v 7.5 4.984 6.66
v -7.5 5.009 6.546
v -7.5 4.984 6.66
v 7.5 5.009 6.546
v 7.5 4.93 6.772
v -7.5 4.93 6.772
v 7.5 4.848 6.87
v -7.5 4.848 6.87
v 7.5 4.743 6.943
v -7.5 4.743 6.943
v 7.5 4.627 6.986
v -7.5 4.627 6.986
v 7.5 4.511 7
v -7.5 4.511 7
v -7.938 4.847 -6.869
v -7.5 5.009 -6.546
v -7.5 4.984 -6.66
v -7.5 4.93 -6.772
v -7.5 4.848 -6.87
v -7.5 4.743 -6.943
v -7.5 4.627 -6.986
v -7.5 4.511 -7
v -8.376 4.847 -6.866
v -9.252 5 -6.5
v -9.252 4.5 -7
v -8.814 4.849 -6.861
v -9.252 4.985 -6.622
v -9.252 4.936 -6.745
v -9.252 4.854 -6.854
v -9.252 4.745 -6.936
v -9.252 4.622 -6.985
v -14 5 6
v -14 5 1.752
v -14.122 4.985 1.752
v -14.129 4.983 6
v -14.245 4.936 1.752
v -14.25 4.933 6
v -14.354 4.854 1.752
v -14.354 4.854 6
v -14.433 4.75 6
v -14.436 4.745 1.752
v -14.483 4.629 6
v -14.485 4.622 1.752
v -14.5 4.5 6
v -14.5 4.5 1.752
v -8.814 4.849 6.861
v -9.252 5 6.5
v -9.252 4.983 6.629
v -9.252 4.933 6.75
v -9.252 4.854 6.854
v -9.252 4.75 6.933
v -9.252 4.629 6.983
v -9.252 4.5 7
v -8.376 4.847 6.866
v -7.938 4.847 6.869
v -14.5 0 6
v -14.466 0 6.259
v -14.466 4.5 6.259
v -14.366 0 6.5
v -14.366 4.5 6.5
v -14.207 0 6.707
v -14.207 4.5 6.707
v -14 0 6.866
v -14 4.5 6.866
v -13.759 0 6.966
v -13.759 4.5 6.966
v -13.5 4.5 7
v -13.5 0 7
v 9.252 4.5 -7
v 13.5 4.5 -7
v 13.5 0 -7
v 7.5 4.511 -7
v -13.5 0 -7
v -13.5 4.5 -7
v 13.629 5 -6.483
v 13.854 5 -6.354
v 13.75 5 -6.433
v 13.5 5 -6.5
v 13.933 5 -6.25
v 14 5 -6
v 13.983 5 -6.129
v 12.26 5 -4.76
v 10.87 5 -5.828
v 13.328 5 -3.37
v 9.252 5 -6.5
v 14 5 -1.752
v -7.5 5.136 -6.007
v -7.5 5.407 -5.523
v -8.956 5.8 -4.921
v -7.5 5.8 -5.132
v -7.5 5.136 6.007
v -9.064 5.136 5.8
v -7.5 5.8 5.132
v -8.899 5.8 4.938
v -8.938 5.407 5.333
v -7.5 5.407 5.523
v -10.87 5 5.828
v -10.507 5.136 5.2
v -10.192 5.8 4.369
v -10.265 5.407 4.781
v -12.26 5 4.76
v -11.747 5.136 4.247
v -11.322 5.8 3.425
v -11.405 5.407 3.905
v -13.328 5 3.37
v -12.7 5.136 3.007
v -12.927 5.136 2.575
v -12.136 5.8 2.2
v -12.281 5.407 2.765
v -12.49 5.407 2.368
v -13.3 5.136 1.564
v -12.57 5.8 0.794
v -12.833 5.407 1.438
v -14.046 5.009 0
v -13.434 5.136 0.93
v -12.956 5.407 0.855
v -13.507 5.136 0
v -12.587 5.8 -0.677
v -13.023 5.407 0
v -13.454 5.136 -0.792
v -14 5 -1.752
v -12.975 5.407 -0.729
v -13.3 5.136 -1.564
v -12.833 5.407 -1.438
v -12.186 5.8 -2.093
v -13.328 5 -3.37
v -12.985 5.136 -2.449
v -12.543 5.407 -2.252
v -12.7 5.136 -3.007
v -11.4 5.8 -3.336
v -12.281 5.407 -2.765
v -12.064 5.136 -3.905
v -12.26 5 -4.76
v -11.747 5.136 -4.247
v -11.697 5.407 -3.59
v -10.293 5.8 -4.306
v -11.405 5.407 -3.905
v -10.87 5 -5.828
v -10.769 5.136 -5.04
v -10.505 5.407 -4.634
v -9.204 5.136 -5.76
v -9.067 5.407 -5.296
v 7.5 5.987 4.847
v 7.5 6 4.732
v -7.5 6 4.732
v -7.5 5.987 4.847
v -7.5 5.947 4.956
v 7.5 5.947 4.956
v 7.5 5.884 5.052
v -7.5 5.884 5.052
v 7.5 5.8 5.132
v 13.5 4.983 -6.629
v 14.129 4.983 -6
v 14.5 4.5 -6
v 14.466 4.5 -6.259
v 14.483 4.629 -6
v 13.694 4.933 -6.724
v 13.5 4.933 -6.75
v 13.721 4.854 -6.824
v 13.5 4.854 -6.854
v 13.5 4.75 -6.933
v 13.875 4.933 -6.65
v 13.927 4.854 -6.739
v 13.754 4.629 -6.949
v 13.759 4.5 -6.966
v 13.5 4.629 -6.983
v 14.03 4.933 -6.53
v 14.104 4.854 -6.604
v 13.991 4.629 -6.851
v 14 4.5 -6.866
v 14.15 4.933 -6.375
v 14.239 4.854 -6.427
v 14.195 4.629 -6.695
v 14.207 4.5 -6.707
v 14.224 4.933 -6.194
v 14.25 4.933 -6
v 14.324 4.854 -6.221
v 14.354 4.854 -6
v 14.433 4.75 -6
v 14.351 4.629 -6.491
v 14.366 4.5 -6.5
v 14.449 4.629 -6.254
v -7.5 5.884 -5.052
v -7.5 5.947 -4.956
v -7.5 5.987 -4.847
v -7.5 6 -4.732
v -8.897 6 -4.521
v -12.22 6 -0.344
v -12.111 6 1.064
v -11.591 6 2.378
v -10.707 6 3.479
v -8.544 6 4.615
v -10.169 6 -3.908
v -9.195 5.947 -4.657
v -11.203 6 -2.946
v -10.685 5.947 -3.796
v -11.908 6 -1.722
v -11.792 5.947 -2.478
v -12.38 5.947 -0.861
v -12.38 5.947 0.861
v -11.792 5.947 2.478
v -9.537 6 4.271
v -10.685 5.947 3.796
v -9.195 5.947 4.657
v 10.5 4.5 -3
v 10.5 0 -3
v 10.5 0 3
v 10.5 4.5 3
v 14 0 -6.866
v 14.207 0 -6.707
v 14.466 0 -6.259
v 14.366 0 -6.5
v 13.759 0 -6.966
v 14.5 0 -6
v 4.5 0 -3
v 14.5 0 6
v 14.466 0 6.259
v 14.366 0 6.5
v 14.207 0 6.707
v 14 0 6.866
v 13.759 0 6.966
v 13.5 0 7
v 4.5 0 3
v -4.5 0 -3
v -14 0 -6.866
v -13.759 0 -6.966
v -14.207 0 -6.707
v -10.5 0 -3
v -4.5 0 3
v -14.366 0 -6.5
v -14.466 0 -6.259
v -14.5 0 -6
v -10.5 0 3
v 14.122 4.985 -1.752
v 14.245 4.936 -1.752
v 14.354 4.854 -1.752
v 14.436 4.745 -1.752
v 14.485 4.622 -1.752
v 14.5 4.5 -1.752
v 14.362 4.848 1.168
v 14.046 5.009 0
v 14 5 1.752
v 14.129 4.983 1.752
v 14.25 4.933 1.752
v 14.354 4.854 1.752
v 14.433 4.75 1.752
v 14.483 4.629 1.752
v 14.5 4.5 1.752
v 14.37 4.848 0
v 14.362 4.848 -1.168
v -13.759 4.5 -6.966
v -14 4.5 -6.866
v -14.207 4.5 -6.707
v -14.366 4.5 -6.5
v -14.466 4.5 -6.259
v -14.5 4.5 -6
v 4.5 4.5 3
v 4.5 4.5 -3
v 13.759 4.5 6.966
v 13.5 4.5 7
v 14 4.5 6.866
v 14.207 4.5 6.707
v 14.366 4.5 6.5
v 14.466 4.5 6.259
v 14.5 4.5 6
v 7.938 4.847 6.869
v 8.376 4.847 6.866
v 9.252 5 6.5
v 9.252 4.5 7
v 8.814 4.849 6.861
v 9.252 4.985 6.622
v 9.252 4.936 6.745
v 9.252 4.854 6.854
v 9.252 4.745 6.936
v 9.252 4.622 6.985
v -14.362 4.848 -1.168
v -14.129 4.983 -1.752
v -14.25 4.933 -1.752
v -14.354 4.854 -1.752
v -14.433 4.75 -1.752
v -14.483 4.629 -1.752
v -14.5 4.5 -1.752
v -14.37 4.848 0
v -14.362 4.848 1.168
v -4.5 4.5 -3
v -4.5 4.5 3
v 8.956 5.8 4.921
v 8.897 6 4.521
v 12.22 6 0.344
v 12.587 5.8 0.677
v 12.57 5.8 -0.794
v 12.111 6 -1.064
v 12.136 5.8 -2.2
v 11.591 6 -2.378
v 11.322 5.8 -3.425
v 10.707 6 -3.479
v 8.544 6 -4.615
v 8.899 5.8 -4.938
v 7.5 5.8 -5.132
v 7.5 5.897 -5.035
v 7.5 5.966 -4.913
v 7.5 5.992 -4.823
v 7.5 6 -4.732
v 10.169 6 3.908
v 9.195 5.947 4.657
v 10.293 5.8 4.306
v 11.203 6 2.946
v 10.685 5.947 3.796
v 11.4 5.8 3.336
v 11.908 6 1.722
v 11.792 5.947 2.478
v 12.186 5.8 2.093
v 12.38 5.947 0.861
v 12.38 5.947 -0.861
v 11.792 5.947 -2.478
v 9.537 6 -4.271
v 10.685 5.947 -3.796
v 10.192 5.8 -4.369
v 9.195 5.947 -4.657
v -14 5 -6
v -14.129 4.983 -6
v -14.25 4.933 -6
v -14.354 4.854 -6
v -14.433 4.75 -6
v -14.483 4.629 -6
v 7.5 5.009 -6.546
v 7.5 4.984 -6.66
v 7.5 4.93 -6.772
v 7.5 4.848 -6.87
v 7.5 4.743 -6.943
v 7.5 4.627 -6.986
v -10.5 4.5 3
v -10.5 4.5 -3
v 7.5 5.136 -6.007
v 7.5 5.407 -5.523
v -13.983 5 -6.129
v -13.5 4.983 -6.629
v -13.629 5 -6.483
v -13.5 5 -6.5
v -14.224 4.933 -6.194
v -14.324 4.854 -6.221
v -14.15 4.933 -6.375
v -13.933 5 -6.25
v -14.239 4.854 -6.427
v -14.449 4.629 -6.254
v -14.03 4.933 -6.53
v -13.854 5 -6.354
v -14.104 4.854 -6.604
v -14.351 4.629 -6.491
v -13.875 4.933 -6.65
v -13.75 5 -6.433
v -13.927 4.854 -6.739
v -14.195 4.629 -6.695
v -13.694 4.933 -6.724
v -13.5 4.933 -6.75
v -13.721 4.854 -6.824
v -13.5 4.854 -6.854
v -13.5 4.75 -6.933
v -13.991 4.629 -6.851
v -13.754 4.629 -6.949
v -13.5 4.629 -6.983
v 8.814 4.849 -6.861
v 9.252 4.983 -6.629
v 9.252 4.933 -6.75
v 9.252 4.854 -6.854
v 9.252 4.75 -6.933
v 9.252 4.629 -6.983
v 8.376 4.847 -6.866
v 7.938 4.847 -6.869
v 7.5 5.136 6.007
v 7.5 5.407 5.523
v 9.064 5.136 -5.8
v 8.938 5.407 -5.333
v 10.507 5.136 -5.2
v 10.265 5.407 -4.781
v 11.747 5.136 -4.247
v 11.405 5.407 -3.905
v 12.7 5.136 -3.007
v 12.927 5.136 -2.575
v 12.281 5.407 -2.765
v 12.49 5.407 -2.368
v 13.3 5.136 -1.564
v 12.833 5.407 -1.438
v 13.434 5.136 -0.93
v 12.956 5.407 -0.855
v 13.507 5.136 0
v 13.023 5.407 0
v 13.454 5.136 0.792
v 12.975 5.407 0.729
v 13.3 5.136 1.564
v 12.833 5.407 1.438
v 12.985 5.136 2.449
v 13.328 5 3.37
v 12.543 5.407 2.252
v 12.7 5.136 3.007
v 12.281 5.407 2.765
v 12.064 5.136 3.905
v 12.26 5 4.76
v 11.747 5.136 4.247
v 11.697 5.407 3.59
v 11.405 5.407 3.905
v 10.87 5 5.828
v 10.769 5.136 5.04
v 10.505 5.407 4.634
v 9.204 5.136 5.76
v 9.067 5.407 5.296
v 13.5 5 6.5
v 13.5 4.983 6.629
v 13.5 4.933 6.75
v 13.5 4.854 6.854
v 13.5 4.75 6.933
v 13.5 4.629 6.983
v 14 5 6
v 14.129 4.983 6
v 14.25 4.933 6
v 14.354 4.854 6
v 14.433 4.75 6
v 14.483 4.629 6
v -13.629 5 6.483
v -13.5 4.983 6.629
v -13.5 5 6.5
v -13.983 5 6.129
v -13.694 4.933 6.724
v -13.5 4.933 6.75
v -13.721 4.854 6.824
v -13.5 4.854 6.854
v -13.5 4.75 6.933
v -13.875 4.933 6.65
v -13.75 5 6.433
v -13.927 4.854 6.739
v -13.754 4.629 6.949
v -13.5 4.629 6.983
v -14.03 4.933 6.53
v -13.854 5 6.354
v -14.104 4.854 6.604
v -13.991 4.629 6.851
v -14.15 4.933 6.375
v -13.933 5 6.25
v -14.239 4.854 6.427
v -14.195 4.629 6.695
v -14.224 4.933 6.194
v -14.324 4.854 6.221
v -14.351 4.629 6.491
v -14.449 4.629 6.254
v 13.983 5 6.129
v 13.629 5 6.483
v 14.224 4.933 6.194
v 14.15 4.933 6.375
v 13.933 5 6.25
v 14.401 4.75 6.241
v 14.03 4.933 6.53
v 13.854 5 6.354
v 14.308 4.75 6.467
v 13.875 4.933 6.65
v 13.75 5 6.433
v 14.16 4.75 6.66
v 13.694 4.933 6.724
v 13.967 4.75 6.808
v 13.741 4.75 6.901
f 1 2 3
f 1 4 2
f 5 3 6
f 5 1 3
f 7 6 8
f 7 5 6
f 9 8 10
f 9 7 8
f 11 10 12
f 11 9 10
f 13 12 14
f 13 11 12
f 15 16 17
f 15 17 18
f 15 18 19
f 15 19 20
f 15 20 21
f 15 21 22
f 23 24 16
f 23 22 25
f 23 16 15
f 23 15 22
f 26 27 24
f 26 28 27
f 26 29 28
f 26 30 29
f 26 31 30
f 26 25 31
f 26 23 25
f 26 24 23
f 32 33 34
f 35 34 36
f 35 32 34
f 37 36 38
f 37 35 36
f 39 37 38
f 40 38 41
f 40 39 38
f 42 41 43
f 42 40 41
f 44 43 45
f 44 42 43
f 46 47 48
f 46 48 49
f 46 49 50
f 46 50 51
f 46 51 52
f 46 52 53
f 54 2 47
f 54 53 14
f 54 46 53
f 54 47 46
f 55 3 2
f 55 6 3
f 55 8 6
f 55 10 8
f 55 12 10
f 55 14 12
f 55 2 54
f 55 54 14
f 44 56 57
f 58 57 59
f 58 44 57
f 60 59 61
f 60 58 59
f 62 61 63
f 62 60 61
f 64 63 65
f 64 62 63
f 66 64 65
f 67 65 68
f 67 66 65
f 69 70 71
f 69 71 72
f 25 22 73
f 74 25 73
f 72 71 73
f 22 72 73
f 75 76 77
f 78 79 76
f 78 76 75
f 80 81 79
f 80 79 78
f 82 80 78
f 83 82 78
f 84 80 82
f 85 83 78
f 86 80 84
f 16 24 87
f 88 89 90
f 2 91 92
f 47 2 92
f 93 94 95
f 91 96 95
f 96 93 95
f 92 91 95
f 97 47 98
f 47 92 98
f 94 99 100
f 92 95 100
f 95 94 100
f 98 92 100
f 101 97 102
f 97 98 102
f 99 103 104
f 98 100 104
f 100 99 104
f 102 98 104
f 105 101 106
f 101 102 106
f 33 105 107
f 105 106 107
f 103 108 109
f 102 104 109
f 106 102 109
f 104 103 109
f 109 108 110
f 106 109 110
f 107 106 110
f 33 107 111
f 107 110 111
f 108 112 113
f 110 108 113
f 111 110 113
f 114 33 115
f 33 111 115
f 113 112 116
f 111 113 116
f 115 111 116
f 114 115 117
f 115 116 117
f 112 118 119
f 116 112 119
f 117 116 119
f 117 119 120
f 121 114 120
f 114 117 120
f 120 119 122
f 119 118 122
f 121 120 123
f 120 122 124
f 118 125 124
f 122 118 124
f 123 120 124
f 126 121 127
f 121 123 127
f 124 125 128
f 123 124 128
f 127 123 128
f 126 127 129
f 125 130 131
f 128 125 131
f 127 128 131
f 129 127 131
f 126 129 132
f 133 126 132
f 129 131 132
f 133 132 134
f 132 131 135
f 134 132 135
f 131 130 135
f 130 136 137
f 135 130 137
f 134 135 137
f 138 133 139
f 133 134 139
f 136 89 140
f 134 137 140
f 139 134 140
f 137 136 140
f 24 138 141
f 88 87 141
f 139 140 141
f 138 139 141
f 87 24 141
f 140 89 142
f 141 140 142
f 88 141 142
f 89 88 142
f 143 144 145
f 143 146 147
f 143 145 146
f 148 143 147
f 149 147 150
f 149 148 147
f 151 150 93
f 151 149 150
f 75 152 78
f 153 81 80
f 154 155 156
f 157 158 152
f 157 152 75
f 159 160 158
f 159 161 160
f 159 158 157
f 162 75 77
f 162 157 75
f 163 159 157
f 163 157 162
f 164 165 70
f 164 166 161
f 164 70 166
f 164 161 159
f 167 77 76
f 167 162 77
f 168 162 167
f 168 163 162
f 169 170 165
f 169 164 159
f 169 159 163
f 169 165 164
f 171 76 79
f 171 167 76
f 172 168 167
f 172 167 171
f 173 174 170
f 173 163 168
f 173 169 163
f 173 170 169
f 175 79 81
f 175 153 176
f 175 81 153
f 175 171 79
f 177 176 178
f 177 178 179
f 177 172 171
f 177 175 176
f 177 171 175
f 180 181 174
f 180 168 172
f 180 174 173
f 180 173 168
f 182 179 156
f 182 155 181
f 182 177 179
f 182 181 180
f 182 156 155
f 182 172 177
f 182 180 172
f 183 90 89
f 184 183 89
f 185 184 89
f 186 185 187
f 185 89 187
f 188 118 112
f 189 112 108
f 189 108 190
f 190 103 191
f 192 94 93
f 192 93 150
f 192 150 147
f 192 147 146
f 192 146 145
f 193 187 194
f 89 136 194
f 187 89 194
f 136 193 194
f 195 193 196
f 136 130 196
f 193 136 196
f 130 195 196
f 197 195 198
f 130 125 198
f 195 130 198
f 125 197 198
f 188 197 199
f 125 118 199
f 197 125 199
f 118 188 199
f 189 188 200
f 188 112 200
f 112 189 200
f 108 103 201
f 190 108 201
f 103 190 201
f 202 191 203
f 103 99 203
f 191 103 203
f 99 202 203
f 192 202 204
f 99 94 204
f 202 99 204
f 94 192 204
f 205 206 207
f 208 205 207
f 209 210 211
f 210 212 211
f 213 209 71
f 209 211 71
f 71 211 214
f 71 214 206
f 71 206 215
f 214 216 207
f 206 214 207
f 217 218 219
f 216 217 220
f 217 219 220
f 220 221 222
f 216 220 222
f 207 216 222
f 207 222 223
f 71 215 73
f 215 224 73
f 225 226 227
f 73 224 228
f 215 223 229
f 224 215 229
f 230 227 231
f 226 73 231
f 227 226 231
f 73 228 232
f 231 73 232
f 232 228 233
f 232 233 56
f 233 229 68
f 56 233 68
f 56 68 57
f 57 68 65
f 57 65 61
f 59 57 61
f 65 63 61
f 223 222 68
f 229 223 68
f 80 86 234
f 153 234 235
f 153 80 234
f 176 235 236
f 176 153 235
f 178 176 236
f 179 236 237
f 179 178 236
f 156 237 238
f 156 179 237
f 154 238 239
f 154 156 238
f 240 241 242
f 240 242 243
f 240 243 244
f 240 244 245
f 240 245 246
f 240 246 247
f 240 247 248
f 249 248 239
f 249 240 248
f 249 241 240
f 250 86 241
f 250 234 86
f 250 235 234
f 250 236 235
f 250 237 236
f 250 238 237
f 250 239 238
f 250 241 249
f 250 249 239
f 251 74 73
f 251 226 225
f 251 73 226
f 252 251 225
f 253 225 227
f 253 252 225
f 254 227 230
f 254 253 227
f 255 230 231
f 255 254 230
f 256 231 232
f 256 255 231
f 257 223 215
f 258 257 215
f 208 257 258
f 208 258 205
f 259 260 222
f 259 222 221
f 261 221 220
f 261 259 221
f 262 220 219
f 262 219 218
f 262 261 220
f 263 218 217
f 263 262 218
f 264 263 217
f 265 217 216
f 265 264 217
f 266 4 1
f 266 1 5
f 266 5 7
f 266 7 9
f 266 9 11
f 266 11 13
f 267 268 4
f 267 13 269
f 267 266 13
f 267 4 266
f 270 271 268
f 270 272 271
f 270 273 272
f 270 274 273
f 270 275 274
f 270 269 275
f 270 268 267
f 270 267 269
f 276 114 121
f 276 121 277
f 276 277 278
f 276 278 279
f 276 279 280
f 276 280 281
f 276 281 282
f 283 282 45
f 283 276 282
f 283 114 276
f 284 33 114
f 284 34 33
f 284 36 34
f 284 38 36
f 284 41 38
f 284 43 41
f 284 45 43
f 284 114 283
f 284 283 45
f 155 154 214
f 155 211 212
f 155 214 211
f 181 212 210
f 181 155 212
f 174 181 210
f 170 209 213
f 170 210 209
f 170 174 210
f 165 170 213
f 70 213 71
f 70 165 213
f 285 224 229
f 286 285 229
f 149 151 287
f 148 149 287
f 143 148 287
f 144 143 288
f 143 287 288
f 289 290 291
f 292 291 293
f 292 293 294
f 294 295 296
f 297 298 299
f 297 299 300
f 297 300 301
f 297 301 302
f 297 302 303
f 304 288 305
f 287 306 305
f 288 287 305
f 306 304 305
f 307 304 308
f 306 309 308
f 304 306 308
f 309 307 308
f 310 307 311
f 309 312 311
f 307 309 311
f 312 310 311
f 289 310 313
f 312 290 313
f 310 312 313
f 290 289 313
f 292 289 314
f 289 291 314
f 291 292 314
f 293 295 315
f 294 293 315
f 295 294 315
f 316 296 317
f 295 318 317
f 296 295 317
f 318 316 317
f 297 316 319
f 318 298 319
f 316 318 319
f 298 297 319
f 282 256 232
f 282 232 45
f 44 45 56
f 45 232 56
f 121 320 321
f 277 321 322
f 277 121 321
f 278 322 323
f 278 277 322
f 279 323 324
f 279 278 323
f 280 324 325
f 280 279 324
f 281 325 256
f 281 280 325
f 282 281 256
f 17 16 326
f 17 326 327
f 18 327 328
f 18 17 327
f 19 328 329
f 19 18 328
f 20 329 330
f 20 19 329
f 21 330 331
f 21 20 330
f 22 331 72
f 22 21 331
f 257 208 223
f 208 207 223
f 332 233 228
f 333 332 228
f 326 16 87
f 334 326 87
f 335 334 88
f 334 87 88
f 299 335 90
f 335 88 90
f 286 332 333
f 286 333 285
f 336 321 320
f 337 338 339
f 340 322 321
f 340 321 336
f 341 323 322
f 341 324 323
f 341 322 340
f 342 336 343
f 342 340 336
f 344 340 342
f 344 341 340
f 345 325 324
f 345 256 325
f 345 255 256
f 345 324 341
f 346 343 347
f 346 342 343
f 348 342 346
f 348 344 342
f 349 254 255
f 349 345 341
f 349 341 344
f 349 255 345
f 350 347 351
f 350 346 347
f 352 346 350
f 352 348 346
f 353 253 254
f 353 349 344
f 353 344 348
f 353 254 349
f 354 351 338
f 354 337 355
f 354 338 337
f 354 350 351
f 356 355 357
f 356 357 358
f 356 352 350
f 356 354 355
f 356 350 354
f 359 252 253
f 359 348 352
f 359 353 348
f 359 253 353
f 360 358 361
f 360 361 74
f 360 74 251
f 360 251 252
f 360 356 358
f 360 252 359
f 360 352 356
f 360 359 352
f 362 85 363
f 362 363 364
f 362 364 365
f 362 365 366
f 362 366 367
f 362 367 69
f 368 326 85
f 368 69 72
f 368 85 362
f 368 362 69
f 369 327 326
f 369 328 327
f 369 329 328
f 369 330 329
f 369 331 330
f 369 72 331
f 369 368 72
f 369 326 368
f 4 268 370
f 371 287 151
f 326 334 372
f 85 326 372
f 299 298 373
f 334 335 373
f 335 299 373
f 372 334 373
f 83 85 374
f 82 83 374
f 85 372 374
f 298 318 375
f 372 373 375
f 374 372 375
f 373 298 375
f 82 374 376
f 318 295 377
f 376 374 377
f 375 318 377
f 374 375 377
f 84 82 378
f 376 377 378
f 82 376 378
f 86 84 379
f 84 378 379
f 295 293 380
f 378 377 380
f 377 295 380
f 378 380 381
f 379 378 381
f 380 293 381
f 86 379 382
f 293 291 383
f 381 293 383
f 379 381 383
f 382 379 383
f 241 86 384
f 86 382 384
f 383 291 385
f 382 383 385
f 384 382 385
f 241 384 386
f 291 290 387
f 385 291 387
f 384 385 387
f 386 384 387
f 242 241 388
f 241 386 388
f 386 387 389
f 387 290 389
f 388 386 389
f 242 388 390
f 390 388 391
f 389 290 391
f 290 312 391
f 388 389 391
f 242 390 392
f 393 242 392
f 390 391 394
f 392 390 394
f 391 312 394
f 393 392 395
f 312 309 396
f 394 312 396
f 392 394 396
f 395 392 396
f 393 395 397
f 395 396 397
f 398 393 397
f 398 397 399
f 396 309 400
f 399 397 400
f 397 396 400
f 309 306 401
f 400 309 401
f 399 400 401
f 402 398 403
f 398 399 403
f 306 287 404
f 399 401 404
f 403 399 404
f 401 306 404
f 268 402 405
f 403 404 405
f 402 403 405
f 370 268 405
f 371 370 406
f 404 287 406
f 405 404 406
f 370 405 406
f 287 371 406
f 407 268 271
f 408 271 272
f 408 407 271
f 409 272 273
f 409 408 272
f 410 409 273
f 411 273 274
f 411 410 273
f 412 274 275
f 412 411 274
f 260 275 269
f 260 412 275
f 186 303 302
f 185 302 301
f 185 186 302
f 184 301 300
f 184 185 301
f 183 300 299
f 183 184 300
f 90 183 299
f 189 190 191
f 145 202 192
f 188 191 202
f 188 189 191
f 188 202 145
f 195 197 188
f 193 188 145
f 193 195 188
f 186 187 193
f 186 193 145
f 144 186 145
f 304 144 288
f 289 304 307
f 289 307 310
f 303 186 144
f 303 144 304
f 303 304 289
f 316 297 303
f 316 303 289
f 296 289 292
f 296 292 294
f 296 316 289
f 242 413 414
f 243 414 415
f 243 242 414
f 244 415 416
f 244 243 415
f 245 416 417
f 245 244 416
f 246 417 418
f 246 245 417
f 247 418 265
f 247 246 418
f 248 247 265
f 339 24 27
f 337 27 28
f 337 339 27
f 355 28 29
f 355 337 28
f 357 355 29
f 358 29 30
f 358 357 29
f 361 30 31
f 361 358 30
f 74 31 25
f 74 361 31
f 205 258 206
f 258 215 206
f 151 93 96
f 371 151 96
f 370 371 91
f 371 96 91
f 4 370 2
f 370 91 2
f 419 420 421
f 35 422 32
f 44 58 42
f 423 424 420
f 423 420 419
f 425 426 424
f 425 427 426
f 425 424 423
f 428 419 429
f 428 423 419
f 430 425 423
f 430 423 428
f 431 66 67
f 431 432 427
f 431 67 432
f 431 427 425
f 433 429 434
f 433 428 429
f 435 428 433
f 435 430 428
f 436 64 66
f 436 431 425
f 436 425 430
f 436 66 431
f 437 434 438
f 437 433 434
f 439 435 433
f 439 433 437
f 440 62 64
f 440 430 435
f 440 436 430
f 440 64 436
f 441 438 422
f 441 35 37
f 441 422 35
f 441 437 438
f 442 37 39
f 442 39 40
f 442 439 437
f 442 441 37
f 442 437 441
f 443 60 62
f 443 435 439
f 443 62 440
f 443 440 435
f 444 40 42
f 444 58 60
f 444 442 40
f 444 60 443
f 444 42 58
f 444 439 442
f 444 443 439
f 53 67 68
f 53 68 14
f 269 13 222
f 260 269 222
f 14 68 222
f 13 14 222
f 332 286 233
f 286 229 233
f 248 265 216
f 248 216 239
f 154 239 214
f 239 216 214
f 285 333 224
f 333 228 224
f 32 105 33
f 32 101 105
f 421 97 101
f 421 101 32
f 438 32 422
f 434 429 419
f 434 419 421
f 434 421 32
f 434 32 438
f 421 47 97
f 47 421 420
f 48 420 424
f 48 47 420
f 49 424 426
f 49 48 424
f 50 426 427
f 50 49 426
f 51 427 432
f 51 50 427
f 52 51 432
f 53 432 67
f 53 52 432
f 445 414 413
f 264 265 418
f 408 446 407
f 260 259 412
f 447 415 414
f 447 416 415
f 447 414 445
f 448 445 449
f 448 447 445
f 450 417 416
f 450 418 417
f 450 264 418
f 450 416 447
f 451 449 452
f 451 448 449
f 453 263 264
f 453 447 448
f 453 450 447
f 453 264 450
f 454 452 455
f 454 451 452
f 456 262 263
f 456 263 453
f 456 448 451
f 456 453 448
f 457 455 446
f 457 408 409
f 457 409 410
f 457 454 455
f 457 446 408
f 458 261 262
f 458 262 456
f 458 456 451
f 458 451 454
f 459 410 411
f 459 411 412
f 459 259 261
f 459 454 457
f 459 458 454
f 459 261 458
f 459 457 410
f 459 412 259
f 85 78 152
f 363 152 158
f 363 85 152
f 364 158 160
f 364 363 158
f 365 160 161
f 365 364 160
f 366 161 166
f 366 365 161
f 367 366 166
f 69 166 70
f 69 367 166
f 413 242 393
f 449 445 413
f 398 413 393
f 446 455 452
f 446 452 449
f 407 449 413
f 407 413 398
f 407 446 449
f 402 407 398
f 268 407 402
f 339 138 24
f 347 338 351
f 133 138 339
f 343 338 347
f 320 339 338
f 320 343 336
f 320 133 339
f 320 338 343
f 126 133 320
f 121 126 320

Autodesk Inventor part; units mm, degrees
ref_plane "YZ Plane" through (0, 0, 0) normal (1, 0, 0) x (0, 1, 0)
ref_plane "XZ Plane" through (0, 0, 0) normal (0, 1, 0) x (-1, 0, 0)
ref_plane "XY Plane" through (0, 0, 0) normal (0, 0, 1) x (1, 0, 0)
sketch "Sketch1" plane through (0, 0, 0) normal (0, 1, 0) x (-1, 0, 0)
  line L0 (14.5, 7) -> (-14.5, 7)
  line L1 (-14.5, 7) -> (-14.5, -7)
  line L2 (-14.5, -7) -> (14.5, -7)
  line L3 (14.5, -7) -> (14.5, 7)
  point P0 (0, 0)
  dimension "d0" = 29
  dimension "d1" = 14
  dimension "d2" = 7
  dimension "d3" = 14.5
extrude "Extrusion1" add sketch "Sketch1" along normal blind 5
sketch "Sketch2" plane through (0, 5, 0) normal (0, 1, 0) x (1, 0, 0)
  circle A0 centre (-7.5, 0) radius 5
  circle A1 centre (7.5, 0) radius 5
  line L0 (-14.5, 7) -> (-14.5, -7) projected
  line L1 (14.5, 7) -> (-14.5, 7) projected
  line L2 (14.5, -7) -> (14.5, 7) projected
  line L3 (-7.5, -5) -> (7.5, -5)
  line L4 (-7.5, 5) -> (7.5, 5)
  point P0 (0, 0)
  dimension "d6" = 10
  dimension "d7" = 10
  dimension "d8" = 7
  dimension "d9" = 7
  dimension "d10" = 7
  dimension "d11" = 7
  dimension "d12" = 5
  dimension "d13" = 5
extrude "Extrusion2" add sketch "Sketch2" along normal blind 1
fillet "Fillet1" radius 2 4 edges at (-12.5, 5, 0) (0, 5, -5) (12.5, 5, 0) (0, 5, 5)
fillet "Fillet2" radius 1 4 edges at (14.5, 2.5, 7) (14.5, 2.5, -7) (-14.5, 2.5, -7) (-14.5, 2.5, 7)
fillet "Fillet3" radius 0.5 12 edges at (14.2071, 5, 6.7071) (14.5, 5, 0) (14.2071, 5, -6.7071) (0, 5, -7) (-14.2071, 5, -6.7071) (-14.5, 5, 0) (-14.2071, 5, 6.7071) (0, 5, 7) (-12.5, 6, 0) (0, 6, 5) (12.5, 6, 0) (0, 6, -5)
sketch "Sketch6" plane through (0, 0, 0) normal (0, -1, 0) x (1, 0, 0)
  line L0 (10.5, 3) -> (4.5, 3)
  line L1 (4.5, 3) -> (4.5, -3)
  line L2 (4.5, -3) -> (10.5, -3)
  line L3 (10.5, -3) -> (10.5, 3)
  line L4 (-4.5, 3) -> (-10.5, 3)
  line L5 (-10.5, 3) -> (-10.5, -3)
  line L6 (-10.5, -3) -> (-4.5, -3)
  line L7 (-4.5, -3) -> (-4.5, 3)
  line L8 (-13.5, 7) -> (13.5, 7) projected
  line L9 (14.5, 6) -> (14.5, -6) projected
  line L10 (-14.5, -6) -> (-14.5, 6) projected
  point P0 (0, 0)
  dimension "d43" = 6
  dimension "d44" = 6
  dimension "d45" = 6
  dimension "d46" = 6
  dimension "d47" = 4
  dimension "d48" = 4
  dimension "d49" = 4
  dimension "d50" = 4
extrude "Extrusion7" cut sketch "Sketch6" against normal blind 4.5
properties part number "Keyboard Button"
